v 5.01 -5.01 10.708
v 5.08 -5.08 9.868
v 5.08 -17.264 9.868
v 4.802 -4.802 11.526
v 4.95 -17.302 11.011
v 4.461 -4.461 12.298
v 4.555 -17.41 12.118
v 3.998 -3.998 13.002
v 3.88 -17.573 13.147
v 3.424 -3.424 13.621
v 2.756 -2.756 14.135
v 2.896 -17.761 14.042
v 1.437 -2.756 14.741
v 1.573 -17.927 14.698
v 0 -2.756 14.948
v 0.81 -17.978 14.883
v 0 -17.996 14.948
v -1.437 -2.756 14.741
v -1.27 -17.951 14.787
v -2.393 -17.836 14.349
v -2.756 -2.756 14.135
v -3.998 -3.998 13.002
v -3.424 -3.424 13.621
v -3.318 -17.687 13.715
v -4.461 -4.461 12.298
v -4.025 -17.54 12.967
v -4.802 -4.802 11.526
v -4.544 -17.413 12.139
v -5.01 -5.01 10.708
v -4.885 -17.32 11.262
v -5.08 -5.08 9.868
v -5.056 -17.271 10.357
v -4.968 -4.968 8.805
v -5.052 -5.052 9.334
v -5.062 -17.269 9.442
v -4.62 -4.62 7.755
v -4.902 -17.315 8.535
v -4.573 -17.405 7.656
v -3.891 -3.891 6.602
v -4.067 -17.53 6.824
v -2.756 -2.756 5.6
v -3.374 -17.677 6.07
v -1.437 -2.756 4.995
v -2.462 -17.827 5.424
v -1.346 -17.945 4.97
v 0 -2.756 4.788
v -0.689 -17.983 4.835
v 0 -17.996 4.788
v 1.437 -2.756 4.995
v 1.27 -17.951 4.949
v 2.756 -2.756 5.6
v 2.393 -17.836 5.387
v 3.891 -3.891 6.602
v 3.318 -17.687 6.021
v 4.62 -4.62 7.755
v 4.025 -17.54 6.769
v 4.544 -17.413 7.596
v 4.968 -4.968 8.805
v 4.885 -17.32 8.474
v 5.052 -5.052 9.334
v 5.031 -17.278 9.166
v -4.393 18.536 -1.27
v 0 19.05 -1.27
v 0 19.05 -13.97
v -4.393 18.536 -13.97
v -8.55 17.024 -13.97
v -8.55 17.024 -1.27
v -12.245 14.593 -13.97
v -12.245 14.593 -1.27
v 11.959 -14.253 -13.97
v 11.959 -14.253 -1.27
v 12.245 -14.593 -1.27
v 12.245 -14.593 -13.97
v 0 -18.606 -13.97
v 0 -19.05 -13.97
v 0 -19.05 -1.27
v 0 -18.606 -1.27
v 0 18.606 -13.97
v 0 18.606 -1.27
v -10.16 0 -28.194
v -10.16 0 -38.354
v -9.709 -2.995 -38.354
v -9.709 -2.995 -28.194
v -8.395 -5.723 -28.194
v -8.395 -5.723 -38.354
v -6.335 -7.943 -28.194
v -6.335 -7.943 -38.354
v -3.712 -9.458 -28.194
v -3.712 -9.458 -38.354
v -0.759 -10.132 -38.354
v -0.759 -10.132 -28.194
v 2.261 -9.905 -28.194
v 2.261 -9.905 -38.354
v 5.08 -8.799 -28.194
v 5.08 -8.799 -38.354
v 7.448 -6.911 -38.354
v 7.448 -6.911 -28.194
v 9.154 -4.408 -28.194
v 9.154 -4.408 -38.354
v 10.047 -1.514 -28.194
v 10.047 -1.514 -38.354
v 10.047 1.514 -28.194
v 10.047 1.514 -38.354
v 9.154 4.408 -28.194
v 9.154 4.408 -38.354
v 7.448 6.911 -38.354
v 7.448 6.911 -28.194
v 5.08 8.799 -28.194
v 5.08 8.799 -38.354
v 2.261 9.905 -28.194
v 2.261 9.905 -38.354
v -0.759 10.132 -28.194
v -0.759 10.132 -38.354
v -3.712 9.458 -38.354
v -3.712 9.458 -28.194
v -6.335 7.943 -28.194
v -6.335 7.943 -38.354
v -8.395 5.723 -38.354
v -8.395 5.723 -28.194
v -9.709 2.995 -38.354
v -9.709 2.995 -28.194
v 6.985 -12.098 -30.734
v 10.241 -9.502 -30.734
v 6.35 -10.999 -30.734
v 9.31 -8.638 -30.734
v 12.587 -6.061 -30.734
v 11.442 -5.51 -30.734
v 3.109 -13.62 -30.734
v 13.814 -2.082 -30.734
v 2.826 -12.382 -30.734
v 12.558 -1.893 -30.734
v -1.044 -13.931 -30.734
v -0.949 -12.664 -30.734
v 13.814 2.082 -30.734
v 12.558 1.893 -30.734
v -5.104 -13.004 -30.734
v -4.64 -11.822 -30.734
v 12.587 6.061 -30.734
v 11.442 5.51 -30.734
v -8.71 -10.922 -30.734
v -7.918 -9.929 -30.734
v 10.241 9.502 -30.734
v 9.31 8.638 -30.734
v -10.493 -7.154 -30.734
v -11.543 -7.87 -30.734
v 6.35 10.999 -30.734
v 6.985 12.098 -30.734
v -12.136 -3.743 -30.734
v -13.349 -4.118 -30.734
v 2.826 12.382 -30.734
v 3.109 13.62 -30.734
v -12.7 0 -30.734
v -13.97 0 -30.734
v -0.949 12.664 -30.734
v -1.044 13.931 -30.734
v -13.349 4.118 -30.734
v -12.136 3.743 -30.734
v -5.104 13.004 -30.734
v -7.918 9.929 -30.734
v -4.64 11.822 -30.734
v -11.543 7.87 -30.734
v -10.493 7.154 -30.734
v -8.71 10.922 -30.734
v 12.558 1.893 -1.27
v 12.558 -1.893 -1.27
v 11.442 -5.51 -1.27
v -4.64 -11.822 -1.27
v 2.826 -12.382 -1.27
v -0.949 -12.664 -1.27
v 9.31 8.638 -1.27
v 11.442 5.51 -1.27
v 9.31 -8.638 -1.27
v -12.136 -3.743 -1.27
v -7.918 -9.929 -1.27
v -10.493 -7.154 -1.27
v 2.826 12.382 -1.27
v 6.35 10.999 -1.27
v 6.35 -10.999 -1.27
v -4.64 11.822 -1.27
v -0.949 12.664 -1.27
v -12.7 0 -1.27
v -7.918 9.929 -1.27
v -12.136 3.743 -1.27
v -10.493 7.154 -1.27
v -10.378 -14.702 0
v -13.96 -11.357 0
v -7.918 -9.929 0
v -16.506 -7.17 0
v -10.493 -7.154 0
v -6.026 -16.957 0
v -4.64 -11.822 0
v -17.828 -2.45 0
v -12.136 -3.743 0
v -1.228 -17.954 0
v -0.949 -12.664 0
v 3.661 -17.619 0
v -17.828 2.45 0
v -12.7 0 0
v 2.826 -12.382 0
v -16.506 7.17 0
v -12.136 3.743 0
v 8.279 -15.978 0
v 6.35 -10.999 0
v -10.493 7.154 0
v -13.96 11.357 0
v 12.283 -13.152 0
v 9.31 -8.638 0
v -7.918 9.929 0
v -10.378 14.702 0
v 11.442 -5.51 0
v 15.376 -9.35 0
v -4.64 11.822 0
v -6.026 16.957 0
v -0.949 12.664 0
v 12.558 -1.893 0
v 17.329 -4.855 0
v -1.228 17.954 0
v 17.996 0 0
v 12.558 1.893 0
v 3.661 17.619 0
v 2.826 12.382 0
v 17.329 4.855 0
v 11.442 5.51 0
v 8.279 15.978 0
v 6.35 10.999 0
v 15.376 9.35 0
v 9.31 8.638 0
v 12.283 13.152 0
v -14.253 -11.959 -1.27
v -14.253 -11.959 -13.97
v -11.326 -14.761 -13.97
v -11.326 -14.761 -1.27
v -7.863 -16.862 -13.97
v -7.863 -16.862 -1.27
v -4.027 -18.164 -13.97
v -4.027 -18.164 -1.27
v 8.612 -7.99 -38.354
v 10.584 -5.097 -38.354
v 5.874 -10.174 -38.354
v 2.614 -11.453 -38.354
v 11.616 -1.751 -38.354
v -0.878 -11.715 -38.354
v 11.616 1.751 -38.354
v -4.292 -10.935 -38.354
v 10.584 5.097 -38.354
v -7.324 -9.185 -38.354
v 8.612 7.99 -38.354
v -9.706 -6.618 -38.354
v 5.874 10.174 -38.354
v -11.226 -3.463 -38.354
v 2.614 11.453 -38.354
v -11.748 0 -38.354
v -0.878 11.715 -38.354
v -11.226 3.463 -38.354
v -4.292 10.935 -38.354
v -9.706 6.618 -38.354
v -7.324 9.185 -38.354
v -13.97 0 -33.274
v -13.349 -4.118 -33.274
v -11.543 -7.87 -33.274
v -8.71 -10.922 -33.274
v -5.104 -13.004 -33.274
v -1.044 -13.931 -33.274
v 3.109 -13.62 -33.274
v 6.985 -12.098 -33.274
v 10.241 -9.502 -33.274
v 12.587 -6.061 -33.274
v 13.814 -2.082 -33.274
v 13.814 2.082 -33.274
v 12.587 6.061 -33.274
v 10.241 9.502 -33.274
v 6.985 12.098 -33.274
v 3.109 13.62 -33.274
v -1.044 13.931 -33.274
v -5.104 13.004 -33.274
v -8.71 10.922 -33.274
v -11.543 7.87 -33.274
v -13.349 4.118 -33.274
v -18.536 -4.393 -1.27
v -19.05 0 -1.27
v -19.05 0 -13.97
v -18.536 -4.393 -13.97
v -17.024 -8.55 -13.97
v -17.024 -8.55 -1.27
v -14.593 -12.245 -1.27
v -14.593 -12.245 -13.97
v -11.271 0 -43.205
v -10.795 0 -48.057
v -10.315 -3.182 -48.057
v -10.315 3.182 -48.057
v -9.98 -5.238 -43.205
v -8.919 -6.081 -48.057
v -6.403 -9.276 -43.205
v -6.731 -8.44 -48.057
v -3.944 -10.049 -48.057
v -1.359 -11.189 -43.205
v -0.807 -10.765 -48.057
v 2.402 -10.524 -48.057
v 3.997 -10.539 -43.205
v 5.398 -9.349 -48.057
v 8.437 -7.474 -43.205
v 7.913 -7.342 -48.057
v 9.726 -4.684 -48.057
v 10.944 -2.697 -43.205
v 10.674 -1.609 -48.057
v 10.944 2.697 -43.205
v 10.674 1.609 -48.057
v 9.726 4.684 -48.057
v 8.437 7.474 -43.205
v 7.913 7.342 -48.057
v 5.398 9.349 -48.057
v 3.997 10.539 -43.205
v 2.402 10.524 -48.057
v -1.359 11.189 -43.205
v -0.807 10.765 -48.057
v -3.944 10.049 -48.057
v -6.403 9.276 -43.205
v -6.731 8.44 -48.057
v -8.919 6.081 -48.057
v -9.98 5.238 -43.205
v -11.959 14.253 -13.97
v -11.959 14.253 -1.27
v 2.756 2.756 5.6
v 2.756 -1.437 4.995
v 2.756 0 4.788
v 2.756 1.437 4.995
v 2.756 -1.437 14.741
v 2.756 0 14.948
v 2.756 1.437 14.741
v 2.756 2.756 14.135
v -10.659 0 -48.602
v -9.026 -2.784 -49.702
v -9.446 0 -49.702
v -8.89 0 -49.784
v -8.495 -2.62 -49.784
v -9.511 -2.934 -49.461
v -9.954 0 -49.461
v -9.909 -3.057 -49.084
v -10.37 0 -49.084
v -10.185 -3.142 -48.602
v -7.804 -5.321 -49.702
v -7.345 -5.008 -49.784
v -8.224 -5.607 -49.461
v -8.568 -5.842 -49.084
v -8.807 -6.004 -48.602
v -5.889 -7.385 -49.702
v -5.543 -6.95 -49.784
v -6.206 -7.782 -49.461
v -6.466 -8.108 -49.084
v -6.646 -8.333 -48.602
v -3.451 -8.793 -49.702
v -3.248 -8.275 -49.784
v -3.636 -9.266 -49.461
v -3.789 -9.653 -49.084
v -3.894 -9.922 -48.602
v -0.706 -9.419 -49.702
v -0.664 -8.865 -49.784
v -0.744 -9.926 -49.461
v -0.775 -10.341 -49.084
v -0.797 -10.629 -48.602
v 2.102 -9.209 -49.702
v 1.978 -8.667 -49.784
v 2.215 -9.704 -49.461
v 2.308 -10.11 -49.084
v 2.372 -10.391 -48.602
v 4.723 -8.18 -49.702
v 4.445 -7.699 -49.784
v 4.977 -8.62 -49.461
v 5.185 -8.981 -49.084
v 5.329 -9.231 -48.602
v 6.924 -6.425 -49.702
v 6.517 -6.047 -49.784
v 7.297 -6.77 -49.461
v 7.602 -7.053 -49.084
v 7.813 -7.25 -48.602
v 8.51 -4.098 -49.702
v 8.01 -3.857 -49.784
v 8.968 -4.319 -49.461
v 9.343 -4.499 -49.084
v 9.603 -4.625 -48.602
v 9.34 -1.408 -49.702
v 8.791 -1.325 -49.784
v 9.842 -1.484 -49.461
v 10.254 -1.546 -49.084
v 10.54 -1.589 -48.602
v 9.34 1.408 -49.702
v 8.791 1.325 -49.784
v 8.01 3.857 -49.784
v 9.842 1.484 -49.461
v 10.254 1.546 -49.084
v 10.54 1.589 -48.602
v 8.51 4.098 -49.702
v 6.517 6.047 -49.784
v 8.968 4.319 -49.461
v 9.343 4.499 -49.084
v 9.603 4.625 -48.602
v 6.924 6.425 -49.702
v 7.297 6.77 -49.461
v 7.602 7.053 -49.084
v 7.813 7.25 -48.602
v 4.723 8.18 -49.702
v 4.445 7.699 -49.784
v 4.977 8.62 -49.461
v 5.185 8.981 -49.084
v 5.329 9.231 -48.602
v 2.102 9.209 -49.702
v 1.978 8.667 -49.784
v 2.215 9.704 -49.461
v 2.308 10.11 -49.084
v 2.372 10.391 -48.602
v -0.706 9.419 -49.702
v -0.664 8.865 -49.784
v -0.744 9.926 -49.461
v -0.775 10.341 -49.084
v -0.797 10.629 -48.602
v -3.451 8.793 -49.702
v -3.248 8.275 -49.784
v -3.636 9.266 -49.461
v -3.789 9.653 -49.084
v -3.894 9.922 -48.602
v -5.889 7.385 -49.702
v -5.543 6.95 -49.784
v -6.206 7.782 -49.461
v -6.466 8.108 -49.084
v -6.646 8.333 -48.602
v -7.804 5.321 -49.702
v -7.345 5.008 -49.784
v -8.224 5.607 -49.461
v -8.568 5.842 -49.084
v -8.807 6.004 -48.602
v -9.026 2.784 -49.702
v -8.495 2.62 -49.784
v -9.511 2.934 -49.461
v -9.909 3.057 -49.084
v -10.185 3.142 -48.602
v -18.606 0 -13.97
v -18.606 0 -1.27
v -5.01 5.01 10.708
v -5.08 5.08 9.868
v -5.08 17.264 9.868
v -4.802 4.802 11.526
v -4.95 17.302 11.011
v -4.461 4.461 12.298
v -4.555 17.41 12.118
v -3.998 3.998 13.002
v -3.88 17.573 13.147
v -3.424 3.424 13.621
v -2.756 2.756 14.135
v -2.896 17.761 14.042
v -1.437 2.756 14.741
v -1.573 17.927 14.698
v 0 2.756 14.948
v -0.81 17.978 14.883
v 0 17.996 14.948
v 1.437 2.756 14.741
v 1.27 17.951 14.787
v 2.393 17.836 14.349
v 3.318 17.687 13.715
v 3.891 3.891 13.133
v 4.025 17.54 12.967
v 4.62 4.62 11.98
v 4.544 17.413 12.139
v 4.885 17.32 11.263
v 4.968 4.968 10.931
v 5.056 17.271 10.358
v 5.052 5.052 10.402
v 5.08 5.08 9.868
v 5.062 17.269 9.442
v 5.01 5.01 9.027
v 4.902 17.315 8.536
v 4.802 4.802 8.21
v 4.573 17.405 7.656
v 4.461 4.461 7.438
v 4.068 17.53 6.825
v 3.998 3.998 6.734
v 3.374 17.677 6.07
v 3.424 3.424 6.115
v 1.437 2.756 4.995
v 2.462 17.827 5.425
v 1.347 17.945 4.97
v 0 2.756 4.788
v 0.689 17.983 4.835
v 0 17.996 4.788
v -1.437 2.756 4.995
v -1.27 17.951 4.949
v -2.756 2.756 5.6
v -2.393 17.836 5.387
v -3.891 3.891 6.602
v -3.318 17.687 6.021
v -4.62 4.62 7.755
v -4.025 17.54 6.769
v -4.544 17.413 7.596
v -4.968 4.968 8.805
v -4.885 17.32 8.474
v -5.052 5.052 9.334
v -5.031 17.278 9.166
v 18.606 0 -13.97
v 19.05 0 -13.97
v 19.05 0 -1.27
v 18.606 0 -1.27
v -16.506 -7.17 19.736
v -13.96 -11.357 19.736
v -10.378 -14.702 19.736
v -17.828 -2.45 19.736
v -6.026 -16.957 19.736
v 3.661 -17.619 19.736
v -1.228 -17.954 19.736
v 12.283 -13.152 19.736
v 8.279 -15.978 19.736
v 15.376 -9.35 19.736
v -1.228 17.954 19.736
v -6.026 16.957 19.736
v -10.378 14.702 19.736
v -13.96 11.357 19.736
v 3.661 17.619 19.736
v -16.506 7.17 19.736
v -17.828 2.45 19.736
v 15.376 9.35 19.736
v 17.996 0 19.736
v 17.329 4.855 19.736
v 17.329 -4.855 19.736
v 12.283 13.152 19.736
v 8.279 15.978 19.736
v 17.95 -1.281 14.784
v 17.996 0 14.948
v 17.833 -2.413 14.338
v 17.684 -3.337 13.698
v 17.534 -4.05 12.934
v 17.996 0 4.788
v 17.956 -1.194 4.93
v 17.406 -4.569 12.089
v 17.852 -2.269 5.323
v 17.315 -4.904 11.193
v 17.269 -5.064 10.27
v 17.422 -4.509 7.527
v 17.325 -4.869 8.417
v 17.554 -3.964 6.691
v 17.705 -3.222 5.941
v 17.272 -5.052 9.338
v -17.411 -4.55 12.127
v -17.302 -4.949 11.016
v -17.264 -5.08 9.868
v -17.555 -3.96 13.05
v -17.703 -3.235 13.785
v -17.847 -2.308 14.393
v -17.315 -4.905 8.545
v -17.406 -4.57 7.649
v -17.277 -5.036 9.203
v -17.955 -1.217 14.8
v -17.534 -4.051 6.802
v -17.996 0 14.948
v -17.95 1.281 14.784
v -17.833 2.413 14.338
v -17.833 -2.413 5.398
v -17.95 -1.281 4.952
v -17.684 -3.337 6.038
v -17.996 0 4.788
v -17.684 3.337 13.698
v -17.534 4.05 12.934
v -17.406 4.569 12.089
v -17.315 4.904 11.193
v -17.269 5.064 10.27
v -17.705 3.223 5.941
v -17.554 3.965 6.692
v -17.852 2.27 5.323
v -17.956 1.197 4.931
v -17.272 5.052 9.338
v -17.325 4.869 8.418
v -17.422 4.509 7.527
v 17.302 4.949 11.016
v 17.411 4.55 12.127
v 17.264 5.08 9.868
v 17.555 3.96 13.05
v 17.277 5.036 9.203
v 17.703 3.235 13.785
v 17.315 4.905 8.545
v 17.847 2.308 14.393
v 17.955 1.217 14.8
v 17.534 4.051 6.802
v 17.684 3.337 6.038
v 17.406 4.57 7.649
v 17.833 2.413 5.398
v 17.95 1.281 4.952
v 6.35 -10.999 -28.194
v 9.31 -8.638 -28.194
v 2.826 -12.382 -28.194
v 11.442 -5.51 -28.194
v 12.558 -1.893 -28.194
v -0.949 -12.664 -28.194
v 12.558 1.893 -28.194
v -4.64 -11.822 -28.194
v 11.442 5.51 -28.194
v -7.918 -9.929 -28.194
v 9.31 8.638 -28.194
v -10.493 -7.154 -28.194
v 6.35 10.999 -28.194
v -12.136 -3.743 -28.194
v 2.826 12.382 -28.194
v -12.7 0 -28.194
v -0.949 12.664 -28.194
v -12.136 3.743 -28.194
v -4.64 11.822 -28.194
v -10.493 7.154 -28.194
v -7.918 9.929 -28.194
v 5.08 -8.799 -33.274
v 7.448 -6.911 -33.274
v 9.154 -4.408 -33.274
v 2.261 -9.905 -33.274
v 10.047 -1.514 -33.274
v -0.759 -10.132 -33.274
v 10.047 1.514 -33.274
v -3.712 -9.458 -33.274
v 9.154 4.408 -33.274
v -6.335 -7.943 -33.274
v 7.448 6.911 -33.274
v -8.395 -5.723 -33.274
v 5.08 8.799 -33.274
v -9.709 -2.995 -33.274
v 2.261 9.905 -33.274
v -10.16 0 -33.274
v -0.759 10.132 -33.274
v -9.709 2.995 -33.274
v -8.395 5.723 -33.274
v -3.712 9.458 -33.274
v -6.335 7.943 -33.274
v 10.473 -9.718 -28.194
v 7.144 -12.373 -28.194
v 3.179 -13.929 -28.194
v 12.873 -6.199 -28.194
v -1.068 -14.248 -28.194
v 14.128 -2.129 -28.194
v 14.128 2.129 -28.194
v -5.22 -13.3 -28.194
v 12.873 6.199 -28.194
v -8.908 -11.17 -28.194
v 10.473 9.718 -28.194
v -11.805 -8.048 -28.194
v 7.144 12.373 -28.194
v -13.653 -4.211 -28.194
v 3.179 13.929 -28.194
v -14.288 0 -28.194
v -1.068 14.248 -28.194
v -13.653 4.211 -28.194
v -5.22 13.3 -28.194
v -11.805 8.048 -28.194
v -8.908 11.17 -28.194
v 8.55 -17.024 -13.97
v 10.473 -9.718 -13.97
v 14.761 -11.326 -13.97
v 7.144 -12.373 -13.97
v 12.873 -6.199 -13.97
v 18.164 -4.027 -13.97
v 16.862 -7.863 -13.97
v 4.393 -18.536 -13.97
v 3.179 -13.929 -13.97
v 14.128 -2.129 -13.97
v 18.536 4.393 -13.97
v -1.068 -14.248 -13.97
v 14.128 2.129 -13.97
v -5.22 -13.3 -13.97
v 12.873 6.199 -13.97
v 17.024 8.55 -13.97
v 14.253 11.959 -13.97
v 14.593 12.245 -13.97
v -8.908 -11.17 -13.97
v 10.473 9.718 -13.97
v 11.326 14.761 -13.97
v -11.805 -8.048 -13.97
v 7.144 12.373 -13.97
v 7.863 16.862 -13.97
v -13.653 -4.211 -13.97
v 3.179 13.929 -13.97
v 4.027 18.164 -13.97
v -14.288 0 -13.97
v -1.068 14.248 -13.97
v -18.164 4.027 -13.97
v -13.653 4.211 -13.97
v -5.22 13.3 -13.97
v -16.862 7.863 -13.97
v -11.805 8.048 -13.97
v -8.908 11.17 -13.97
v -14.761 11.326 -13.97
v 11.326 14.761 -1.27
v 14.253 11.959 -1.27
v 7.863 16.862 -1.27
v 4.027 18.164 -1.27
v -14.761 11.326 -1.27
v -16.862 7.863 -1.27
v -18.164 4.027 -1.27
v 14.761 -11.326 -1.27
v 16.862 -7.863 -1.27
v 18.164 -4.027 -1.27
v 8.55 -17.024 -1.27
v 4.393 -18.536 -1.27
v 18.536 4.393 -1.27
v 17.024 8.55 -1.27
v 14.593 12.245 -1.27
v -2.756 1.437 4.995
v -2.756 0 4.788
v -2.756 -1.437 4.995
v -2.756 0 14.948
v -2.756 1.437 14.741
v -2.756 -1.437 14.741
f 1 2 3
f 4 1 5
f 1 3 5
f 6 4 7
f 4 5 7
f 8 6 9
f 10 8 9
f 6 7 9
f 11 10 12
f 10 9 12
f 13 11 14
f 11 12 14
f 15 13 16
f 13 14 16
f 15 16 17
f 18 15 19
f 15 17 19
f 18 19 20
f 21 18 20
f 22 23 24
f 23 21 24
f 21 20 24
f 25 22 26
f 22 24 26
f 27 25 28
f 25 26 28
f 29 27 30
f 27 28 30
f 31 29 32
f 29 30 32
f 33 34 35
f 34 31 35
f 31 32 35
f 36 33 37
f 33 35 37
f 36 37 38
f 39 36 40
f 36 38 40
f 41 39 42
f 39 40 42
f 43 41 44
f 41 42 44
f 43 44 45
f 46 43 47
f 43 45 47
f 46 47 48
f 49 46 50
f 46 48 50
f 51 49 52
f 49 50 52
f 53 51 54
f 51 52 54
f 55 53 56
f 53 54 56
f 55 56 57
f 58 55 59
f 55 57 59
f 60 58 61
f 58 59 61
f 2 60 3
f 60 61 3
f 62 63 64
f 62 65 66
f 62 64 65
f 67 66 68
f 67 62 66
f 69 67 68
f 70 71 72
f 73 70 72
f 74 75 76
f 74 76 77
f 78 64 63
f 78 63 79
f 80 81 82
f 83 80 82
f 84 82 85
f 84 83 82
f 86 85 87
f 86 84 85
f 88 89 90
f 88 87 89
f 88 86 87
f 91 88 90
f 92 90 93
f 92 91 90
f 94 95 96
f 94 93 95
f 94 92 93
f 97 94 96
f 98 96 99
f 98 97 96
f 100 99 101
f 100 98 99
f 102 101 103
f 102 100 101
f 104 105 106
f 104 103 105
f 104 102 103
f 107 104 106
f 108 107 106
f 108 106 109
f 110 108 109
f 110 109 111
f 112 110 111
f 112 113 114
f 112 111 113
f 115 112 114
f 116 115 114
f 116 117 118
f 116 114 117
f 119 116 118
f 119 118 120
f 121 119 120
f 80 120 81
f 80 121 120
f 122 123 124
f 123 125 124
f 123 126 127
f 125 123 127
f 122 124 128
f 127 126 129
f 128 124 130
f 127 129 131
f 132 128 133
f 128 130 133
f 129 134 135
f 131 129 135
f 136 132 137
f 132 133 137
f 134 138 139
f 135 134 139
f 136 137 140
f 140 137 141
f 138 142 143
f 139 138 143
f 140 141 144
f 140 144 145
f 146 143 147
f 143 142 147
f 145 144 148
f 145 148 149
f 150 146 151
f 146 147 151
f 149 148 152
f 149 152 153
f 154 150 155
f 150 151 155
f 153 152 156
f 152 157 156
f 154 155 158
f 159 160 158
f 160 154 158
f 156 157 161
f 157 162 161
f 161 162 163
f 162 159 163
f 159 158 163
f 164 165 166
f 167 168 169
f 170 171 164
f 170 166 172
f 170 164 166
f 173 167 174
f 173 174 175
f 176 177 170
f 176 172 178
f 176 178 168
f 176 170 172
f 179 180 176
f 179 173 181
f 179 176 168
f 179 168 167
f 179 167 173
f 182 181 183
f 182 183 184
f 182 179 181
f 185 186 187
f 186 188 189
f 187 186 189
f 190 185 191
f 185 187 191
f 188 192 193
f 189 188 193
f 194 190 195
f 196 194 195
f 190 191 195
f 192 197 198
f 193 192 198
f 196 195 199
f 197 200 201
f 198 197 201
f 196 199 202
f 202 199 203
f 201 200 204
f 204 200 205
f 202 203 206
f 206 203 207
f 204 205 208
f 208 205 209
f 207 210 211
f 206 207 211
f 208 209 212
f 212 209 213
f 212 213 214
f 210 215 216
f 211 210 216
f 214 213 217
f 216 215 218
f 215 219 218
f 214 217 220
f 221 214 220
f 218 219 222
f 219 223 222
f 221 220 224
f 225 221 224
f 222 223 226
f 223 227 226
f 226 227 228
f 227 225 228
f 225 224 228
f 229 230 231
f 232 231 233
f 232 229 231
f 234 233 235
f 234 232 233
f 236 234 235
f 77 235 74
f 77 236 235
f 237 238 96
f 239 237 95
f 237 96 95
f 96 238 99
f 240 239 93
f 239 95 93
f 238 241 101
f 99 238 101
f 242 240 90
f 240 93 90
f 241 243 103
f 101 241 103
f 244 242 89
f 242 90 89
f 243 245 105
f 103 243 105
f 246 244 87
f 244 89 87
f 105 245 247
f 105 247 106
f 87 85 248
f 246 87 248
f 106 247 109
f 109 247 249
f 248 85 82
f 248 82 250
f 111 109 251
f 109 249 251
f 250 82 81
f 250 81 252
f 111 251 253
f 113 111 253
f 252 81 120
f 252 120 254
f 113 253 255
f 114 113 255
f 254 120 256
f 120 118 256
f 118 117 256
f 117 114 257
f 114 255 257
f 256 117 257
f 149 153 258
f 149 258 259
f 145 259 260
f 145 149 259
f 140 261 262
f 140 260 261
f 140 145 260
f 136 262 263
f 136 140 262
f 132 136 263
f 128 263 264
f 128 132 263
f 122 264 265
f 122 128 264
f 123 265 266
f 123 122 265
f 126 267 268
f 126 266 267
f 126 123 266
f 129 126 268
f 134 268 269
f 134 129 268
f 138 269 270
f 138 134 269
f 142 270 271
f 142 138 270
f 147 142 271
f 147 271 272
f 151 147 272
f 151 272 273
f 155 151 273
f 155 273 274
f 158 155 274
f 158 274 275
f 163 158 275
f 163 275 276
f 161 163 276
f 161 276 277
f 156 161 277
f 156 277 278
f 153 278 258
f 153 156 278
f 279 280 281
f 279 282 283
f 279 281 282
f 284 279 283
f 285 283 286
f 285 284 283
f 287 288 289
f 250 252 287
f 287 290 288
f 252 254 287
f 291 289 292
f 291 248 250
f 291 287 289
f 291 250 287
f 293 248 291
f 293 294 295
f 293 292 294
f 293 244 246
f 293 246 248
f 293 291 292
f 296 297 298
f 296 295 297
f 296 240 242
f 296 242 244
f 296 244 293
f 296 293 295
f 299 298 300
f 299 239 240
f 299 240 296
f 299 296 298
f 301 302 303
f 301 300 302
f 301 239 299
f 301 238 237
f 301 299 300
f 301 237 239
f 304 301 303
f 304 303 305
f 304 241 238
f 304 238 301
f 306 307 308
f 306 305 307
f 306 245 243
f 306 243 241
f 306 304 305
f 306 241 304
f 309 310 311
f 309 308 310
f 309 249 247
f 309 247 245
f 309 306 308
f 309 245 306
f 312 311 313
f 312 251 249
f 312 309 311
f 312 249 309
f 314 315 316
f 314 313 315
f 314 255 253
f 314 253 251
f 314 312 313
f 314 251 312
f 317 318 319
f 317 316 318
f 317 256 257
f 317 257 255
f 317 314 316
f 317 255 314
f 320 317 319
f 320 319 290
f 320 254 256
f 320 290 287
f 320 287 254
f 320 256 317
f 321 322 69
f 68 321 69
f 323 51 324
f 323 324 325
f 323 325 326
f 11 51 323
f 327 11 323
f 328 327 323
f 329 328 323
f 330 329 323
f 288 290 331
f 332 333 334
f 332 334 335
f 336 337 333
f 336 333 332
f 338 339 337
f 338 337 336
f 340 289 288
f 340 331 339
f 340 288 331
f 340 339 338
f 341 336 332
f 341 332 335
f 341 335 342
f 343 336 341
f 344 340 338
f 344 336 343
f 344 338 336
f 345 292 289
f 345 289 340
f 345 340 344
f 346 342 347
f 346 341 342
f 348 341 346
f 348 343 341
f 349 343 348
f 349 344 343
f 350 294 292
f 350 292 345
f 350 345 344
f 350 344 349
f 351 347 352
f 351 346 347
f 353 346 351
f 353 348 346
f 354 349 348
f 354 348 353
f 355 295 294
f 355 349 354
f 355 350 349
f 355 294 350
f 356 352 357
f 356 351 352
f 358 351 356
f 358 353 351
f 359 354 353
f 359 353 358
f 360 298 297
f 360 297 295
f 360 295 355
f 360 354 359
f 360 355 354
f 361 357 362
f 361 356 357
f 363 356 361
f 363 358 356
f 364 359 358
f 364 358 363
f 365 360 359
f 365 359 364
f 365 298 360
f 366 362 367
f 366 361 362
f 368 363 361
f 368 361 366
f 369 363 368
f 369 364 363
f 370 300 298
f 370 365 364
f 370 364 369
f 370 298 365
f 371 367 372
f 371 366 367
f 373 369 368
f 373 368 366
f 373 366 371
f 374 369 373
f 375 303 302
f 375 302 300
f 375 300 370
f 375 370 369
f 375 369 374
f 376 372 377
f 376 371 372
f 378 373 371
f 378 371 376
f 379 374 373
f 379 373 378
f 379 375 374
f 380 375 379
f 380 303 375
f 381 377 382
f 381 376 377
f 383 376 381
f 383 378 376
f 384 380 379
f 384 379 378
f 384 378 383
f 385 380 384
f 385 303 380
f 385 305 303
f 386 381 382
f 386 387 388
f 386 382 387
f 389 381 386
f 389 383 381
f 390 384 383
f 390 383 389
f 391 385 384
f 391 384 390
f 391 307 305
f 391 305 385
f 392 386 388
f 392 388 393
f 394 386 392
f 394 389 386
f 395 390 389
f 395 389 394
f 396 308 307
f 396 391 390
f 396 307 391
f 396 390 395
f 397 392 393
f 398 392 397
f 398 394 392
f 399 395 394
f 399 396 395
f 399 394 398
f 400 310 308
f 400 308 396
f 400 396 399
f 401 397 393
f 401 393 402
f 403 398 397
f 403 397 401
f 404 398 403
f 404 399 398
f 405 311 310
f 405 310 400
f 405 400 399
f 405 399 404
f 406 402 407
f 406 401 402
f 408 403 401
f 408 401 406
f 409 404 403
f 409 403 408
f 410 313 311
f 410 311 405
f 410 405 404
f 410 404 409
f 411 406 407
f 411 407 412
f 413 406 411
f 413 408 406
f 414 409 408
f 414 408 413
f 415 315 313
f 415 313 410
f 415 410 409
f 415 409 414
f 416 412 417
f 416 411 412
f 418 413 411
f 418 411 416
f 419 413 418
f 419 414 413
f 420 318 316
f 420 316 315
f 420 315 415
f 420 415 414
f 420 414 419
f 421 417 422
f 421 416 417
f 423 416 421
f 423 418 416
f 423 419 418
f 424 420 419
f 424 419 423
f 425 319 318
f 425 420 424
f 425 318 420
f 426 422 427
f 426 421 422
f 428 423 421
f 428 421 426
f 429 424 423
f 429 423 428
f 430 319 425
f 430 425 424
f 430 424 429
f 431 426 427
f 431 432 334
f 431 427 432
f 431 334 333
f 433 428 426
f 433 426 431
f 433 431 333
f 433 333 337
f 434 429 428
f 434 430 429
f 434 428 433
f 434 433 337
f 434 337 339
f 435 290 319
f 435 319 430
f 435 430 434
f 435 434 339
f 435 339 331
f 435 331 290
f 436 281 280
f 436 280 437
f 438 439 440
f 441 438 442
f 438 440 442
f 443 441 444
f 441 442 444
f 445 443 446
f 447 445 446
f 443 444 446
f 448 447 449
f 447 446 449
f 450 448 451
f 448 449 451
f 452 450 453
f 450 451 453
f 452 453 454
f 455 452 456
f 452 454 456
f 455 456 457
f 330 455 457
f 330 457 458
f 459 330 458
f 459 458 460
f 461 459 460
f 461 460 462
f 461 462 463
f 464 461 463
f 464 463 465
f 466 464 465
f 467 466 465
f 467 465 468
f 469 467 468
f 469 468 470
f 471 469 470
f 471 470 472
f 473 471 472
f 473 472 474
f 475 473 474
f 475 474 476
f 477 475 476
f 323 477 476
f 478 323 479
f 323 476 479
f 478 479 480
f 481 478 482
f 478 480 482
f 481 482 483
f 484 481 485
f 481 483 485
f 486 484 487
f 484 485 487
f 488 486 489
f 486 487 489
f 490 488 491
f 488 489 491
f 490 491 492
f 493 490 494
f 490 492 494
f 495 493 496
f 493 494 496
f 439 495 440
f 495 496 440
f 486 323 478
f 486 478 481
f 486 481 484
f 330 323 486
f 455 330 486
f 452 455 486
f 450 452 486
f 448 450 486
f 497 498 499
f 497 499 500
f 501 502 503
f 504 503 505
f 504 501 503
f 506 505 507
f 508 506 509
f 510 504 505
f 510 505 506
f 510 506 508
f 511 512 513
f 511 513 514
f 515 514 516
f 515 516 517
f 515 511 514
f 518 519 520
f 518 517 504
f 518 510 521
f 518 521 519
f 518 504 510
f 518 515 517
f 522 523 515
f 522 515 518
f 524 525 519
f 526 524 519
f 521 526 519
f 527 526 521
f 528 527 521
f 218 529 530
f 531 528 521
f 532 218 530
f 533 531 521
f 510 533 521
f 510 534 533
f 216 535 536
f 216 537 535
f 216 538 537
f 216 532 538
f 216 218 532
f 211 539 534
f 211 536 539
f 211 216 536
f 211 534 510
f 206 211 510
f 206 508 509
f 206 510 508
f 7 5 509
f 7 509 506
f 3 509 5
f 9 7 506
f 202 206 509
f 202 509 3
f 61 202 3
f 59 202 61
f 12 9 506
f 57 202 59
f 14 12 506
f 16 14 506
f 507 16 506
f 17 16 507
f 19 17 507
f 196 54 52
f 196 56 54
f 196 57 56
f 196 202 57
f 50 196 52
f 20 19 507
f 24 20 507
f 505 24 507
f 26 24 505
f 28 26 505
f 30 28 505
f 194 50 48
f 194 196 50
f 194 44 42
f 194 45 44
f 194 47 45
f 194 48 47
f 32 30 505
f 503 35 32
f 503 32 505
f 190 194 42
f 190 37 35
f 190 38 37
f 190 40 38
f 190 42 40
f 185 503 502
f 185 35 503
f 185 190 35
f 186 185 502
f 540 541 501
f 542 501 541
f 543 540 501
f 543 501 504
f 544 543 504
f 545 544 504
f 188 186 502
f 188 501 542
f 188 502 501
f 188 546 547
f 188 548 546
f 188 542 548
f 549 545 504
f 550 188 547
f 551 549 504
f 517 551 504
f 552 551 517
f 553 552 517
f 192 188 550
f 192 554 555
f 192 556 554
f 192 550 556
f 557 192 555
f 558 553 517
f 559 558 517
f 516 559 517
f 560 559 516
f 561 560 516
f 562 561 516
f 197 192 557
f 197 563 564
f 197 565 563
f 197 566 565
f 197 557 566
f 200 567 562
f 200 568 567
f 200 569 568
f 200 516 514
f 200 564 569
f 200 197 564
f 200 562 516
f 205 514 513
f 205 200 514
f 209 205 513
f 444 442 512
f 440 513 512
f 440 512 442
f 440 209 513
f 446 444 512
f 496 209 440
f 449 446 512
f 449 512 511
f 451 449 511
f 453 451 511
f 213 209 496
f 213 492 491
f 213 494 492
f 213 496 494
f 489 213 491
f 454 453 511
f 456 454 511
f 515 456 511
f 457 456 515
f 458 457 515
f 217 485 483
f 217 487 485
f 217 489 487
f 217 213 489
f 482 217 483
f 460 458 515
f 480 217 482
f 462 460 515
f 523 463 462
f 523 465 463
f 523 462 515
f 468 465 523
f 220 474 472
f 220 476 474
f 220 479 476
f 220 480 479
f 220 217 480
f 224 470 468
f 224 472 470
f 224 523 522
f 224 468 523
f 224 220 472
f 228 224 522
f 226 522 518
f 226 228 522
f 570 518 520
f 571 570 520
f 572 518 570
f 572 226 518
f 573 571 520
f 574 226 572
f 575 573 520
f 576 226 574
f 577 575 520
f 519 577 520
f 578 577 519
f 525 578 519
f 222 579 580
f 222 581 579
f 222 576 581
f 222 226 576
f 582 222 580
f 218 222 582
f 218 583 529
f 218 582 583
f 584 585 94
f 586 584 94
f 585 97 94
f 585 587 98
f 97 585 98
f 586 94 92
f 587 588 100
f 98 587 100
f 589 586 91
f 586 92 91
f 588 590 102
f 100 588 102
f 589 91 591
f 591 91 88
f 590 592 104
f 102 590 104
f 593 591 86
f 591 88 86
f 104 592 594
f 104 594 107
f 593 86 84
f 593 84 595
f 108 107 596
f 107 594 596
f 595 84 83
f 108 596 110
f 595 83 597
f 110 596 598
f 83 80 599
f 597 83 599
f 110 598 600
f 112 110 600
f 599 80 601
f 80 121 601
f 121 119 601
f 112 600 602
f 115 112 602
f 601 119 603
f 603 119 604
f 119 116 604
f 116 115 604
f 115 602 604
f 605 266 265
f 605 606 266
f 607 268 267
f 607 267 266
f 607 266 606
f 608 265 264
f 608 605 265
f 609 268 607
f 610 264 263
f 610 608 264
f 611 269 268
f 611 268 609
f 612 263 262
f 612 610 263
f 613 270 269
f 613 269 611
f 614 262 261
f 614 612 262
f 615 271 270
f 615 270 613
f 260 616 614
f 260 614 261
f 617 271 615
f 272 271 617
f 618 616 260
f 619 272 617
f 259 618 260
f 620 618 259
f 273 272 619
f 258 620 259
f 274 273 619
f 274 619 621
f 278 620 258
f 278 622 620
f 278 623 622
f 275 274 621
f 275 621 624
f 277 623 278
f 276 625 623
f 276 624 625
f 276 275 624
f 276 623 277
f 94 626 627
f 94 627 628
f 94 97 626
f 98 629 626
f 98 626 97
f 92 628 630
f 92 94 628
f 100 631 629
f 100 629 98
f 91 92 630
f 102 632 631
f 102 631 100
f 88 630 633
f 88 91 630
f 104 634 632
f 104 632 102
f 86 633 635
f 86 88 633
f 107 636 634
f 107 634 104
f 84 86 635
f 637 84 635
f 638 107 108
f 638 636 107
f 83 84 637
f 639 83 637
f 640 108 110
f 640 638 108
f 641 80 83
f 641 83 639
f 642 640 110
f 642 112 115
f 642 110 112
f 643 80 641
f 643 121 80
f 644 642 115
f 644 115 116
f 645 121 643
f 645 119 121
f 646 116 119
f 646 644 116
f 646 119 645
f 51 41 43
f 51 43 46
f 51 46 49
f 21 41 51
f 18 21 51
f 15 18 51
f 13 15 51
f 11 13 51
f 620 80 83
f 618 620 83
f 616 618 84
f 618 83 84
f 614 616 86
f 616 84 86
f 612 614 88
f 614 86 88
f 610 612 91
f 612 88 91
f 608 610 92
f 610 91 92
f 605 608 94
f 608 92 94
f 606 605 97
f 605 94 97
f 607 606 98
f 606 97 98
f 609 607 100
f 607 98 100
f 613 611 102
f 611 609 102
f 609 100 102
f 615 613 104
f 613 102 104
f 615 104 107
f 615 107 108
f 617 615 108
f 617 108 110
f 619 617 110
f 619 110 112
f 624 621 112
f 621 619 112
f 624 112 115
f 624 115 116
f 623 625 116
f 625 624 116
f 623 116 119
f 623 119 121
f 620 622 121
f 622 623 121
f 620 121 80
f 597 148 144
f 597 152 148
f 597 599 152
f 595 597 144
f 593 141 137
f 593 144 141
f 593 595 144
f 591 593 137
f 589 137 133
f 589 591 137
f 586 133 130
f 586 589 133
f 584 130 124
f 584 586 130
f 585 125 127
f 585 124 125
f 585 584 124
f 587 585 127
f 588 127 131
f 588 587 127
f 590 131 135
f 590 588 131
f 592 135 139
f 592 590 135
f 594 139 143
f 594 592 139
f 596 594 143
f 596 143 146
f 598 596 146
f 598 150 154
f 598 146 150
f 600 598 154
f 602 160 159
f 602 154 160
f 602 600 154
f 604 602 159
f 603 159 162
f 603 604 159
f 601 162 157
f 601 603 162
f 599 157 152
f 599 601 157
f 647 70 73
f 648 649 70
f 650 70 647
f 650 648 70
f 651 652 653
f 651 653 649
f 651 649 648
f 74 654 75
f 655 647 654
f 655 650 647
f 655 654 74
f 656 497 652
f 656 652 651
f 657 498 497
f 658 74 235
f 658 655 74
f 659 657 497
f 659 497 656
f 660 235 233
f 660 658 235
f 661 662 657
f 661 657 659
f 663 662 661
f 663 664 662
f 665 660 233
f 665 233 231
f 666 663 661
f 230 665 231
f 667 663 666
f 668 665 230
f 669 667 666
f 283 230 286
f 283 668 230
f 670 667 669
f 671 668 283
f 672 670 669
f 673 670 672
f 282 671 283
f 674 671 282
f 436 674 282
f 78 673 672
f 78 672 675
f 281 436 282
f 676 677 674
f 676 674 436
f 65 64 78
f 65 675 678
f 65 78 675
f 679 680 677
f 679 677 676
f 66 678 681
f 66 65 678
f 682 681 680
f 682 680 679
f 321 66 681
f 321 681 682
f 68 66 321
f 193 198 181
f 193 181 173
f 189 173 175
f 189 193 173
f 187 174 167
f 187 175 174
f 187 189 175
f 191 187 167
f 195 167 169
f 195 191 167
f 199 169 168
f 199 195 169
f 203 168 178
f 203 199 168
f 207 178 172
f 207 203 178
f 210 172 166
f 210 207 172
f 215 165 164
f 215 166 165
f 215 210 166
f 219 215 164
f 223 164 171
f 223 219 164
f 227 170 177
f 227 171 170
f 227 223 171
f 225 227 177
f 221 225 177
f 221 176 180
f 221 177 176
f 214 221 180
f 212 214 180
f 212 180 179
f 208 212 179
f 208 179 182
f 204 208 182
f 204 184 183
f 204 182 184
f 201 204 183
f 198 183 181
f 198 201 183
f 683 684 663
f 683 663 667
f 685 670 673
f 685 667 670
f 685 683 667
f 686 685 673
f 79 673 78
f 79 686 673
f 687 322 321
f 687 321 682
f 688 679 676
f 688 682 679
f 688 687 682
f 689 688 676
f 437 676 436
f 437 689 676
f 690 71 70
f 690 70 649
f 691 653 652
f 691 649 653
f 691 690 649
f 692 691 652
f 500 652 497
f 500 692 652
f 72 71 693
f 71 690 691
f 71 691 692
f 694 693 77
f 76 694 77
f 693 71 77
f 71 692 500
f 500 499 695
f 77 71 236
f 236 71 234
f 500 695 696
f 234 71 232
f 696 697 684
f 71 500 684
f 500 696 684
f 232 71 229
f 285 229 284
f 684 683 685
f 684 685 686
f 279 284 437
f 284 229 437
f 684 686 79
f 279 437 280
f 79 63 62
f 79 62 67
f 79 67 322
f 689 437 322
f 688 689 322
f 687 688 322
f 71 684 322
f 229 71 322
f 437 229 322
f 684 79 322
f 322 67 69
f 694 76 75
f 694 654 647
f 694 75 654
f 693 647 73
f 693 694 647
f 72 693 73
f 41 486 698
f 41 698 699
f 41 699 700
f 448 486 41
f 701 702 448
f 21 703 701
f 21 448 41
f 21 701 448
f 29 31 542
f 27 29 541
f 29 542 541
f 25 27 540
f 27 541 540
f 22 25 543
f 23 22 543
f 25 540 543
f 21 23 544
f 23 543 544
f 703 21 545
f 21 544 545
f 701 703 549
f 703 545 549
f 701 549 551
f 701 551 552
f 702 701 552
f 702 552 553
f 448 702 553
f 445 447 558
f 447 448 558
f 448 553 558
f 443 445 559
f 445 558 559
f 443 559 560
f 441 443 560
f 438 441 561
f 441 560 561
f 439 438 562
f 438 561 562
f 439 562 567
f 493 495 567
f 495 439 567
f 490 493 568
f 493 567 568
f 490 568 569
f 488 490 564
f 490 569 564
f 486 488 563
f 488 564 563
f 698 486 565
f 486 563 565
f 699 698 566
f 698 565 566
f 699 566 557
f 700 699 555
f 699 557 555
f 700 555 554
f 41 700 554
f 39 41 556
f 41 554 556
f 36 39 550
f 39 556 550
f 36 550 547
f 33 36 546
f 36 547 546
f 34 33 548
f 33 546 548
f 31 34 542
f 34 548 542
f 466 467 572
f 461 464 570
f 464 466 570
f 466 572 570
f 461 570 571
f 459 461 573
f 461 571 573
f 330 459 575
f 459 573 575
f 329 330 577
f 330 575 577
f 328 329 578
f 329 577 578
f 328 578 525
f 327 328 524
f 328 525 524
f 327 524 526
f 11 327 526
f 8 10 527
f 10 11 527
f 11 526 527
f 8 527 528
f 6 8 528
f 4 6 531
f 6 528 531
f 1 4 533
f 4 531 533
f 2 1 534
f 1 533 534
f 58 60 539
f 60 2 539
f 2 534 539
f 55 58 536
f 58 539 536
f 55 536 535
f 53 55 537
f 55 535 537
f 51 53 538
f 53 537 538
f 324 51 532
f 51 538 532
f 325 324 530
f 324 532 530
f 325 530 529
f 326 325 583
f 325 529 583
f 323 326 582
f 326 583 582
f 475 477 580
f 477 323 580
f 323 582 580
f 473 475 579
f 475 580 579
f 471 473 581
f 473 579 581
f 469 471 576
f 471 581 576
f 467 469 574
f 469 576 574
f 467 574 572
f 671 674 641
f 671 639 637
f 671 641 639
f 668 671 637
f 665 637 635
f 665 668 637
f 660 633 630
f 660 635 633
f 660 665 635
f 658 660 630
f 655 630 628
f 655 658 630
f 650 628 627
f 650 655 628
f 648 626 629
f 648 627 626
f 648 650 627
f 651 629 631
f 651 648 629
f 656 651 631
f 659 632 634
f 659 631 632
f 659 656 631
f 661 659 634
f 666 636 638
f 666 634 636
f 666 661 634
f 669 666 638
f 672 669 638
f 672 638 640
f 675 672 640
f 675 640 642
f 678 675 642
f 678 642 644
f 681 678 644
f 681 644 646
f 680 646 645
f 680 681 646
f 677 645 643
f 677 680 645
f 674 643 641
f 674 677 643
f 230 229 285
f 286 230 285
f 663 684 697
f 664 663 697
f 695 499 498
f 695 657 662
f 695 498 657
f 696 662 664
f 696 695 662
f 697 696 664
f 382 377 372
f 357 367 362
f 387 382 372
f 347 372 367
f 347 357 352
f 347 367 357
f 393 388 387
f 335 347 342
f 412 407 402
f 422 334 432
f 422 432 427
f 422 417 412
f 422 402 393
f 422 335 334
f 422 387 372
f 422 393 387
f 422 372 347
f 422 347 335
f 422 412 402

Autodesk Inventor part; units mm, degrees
ref_plane "YZ Plane" through (0, 0, 0) normal (1, 0, 0) x (0, 1, 0)
ref_plane "XY Plane" through (0, 0, 0) normal (0, 0, 1) x (1, 0, 0)
sketch "Sketch1" plane through (0, 0, 0) normal (0, 0, 1) x (1, 0, 0)
  circle A0 centre (0, 0) radius 17.9959
  dimension "d0" = 35.9918
extrude "Extrusion1" add sketch "Sketch1" along normal blind 19.7358
sketch "Sketch2" plane through (0, 0, 0) normal (0, 0, -1) x (-1, 0, 0)
  circle A0 centre (0, 0) radius 12.7
  dimension "d3" = 25.4
extrude "Extrusion2" add sketch "Sketch2" along normal blind 1.27
sketch "Sketch3" plane through (0, 0, -1.27) normal (0, 0, -1) x (-1, 0, 0)
  circle A0 centre (0, 0) radius 18.6055
  arc A1 (12.2451, 14.5931) -> (0, 19.05) centre (0, 0) ccw
  line L0 (0, 0) -> (12.2451, 14.5931) construction
  line L1 (0, 0) -> (0, 19.05) construction
  line L2 (0, 19.05) -> (0, 18.6055)
  line L3 (11.9594, 14.2526) -> (12.2451, 14.5931)
  arc A2 (11.9594, 14.2526) -> (0, 18.6055) centre (0, 0) ccw
  arc A3 (-14.5931, 12.2451) -> (-19.05, 0) centre (0, 0) ccw
  line L4 (-19.05, 0) -> (-18.6055, 0)
  arc A4 (-14.2526, 11.9594) -> (-18.6055, 0) centre (0, 0) ccw
  line L5 (-14.2526, 11.9594) -> (-14.5931, 12.2451)
  arc A5 (-12.2451, -14.5931) -> (0, -19.05) centre (0, 0) ccw
  line L6 (0, -19.05) -> (0, -18.6055)
  arc A6 (-11.9594, -14.2526) -> (0, -18.6055) centre (0, 0) ccw
  line L7 (-11.9594, -14.2526) -> (-12.2451, -14.5931)
  arc A7 (14.5931, -12.2451) -> (19.05, 0) centre (0, 0) ccw
  line L8 (19.05, 0) -> (18.6055, 0)
  arc A8 (14.2526, -11.9594) -> (18.6055, 0) centre (0, 0) ccw
  line L9 (14.2526, -11.9594) -> (14.5931, -12.2451)
  dimension "d6" = 37.211
  dimension "d7" = 19.05
  dimension "d8" = 40
  dimension "d11" = 360
extrude "Extrusion3" add sketch "Sketch3" along normal blind 12.7 separate body
sketch "Sketch4" plane through (0, 0, -13.97) normal (0, 0, -1) x (-1, 0, 0)
  circle A0 centre (0, 0) radius 14.2875
  dimension "d15" = 28.575
extrude "Extrusion4" add sketch "Sketch4" along normal blind 14.224 bodies 2
sketch "Sketch5" plane through (0, 0, -28.194) normal (0, 0, -1) x (-1, 0, 0)
  circle A0 centre (0, 0) radius 10.16
  dimension "d18" = 20.32
extrude "Extrusion5" add sketch "Sketch5" along normal blind 10.16 bodies 2
sketch "Sketch6" plane through (0, 0, 0) normal (0, 1, 0) x (-1, 0, 0)
  line L0 (-10.16, -38.354) -> (10.16, -38.354) construction
  line L1 (0, -38.354) -> (11.7475, -38.354)
  line L2 (0, -38.354) -> (0, -49.784)
  line L3 (0, -49.784) -> (8.89, -49.784)
  arc A0 (8.89, -49.784) -> (10.795, -48.0569) centre (8.89, -47.8698) ccw
  line L4 (10.795, -48.0569) -> (11.7475, -38.354)
  point P0 (0, 0)
  dimension "d21" = 11.7475
  dimension "d22" = 11.43
  dimension "d23" = 8.89
  dimension "d24" = 10.795
revolve "Revolution1" add sketch "Sketch6" angle 360 about axis through (0, 0, -38.354) along (0, 0, -1) bodies 2
sketch "Sketch7" plane through (0, 0, -28.194) normal (0, 0, -1) x (-1, 0, 0)
  circle A0 centre (0, 0) radius 10.16 projected
  circle A1 centre (0, 0) radius 12.7
  dimension "d26" = 25.4
extrude "Extrusion6" add sketch "Sketch7" along normal blind 2.54 separate body
sketch "Sketch8" plane through (0, 0, -30.734) normal (0, 0, -1) x (-1, 0, 0)
  circle A0 centre (0, 0) radius 10.16 projected
  circle A1 centre (0, 0) radius 13.97
  dimension "d29" = 27.94
extrude "Extrusion7" add sketch "Sketch8" along normal blind 2.54 bodies 3
ref_plane "Work Plane1" through (0, 17.9959, 0) normal (0, 1, 0) x (-1, 0, 0)
sketch "Sketch9" plane through (0, 17.9959, 0) normal (0, 1, 0) x (-1, 0, 0)
  line L0 (0, 0) -> (0, 19.7358) construction
  line L1 (17.9959, 19.7358) -> (-17.9959, 19.7358) construction
  circle A0 centre (0, 9.8679) radius 5.08
  dimension "d32" = 10.16
extrude "Extrusion8" cut sketch "Sketch9" against normal blind 15.24 bodies 1
pattern_circular "Circular Pattern1" count 4 over 360 about axis through (0, 0, 0) along (0, 0, 1) of "Extrusion8" bodies 1
properties part number "101-3002-1" material "Aluminum"
